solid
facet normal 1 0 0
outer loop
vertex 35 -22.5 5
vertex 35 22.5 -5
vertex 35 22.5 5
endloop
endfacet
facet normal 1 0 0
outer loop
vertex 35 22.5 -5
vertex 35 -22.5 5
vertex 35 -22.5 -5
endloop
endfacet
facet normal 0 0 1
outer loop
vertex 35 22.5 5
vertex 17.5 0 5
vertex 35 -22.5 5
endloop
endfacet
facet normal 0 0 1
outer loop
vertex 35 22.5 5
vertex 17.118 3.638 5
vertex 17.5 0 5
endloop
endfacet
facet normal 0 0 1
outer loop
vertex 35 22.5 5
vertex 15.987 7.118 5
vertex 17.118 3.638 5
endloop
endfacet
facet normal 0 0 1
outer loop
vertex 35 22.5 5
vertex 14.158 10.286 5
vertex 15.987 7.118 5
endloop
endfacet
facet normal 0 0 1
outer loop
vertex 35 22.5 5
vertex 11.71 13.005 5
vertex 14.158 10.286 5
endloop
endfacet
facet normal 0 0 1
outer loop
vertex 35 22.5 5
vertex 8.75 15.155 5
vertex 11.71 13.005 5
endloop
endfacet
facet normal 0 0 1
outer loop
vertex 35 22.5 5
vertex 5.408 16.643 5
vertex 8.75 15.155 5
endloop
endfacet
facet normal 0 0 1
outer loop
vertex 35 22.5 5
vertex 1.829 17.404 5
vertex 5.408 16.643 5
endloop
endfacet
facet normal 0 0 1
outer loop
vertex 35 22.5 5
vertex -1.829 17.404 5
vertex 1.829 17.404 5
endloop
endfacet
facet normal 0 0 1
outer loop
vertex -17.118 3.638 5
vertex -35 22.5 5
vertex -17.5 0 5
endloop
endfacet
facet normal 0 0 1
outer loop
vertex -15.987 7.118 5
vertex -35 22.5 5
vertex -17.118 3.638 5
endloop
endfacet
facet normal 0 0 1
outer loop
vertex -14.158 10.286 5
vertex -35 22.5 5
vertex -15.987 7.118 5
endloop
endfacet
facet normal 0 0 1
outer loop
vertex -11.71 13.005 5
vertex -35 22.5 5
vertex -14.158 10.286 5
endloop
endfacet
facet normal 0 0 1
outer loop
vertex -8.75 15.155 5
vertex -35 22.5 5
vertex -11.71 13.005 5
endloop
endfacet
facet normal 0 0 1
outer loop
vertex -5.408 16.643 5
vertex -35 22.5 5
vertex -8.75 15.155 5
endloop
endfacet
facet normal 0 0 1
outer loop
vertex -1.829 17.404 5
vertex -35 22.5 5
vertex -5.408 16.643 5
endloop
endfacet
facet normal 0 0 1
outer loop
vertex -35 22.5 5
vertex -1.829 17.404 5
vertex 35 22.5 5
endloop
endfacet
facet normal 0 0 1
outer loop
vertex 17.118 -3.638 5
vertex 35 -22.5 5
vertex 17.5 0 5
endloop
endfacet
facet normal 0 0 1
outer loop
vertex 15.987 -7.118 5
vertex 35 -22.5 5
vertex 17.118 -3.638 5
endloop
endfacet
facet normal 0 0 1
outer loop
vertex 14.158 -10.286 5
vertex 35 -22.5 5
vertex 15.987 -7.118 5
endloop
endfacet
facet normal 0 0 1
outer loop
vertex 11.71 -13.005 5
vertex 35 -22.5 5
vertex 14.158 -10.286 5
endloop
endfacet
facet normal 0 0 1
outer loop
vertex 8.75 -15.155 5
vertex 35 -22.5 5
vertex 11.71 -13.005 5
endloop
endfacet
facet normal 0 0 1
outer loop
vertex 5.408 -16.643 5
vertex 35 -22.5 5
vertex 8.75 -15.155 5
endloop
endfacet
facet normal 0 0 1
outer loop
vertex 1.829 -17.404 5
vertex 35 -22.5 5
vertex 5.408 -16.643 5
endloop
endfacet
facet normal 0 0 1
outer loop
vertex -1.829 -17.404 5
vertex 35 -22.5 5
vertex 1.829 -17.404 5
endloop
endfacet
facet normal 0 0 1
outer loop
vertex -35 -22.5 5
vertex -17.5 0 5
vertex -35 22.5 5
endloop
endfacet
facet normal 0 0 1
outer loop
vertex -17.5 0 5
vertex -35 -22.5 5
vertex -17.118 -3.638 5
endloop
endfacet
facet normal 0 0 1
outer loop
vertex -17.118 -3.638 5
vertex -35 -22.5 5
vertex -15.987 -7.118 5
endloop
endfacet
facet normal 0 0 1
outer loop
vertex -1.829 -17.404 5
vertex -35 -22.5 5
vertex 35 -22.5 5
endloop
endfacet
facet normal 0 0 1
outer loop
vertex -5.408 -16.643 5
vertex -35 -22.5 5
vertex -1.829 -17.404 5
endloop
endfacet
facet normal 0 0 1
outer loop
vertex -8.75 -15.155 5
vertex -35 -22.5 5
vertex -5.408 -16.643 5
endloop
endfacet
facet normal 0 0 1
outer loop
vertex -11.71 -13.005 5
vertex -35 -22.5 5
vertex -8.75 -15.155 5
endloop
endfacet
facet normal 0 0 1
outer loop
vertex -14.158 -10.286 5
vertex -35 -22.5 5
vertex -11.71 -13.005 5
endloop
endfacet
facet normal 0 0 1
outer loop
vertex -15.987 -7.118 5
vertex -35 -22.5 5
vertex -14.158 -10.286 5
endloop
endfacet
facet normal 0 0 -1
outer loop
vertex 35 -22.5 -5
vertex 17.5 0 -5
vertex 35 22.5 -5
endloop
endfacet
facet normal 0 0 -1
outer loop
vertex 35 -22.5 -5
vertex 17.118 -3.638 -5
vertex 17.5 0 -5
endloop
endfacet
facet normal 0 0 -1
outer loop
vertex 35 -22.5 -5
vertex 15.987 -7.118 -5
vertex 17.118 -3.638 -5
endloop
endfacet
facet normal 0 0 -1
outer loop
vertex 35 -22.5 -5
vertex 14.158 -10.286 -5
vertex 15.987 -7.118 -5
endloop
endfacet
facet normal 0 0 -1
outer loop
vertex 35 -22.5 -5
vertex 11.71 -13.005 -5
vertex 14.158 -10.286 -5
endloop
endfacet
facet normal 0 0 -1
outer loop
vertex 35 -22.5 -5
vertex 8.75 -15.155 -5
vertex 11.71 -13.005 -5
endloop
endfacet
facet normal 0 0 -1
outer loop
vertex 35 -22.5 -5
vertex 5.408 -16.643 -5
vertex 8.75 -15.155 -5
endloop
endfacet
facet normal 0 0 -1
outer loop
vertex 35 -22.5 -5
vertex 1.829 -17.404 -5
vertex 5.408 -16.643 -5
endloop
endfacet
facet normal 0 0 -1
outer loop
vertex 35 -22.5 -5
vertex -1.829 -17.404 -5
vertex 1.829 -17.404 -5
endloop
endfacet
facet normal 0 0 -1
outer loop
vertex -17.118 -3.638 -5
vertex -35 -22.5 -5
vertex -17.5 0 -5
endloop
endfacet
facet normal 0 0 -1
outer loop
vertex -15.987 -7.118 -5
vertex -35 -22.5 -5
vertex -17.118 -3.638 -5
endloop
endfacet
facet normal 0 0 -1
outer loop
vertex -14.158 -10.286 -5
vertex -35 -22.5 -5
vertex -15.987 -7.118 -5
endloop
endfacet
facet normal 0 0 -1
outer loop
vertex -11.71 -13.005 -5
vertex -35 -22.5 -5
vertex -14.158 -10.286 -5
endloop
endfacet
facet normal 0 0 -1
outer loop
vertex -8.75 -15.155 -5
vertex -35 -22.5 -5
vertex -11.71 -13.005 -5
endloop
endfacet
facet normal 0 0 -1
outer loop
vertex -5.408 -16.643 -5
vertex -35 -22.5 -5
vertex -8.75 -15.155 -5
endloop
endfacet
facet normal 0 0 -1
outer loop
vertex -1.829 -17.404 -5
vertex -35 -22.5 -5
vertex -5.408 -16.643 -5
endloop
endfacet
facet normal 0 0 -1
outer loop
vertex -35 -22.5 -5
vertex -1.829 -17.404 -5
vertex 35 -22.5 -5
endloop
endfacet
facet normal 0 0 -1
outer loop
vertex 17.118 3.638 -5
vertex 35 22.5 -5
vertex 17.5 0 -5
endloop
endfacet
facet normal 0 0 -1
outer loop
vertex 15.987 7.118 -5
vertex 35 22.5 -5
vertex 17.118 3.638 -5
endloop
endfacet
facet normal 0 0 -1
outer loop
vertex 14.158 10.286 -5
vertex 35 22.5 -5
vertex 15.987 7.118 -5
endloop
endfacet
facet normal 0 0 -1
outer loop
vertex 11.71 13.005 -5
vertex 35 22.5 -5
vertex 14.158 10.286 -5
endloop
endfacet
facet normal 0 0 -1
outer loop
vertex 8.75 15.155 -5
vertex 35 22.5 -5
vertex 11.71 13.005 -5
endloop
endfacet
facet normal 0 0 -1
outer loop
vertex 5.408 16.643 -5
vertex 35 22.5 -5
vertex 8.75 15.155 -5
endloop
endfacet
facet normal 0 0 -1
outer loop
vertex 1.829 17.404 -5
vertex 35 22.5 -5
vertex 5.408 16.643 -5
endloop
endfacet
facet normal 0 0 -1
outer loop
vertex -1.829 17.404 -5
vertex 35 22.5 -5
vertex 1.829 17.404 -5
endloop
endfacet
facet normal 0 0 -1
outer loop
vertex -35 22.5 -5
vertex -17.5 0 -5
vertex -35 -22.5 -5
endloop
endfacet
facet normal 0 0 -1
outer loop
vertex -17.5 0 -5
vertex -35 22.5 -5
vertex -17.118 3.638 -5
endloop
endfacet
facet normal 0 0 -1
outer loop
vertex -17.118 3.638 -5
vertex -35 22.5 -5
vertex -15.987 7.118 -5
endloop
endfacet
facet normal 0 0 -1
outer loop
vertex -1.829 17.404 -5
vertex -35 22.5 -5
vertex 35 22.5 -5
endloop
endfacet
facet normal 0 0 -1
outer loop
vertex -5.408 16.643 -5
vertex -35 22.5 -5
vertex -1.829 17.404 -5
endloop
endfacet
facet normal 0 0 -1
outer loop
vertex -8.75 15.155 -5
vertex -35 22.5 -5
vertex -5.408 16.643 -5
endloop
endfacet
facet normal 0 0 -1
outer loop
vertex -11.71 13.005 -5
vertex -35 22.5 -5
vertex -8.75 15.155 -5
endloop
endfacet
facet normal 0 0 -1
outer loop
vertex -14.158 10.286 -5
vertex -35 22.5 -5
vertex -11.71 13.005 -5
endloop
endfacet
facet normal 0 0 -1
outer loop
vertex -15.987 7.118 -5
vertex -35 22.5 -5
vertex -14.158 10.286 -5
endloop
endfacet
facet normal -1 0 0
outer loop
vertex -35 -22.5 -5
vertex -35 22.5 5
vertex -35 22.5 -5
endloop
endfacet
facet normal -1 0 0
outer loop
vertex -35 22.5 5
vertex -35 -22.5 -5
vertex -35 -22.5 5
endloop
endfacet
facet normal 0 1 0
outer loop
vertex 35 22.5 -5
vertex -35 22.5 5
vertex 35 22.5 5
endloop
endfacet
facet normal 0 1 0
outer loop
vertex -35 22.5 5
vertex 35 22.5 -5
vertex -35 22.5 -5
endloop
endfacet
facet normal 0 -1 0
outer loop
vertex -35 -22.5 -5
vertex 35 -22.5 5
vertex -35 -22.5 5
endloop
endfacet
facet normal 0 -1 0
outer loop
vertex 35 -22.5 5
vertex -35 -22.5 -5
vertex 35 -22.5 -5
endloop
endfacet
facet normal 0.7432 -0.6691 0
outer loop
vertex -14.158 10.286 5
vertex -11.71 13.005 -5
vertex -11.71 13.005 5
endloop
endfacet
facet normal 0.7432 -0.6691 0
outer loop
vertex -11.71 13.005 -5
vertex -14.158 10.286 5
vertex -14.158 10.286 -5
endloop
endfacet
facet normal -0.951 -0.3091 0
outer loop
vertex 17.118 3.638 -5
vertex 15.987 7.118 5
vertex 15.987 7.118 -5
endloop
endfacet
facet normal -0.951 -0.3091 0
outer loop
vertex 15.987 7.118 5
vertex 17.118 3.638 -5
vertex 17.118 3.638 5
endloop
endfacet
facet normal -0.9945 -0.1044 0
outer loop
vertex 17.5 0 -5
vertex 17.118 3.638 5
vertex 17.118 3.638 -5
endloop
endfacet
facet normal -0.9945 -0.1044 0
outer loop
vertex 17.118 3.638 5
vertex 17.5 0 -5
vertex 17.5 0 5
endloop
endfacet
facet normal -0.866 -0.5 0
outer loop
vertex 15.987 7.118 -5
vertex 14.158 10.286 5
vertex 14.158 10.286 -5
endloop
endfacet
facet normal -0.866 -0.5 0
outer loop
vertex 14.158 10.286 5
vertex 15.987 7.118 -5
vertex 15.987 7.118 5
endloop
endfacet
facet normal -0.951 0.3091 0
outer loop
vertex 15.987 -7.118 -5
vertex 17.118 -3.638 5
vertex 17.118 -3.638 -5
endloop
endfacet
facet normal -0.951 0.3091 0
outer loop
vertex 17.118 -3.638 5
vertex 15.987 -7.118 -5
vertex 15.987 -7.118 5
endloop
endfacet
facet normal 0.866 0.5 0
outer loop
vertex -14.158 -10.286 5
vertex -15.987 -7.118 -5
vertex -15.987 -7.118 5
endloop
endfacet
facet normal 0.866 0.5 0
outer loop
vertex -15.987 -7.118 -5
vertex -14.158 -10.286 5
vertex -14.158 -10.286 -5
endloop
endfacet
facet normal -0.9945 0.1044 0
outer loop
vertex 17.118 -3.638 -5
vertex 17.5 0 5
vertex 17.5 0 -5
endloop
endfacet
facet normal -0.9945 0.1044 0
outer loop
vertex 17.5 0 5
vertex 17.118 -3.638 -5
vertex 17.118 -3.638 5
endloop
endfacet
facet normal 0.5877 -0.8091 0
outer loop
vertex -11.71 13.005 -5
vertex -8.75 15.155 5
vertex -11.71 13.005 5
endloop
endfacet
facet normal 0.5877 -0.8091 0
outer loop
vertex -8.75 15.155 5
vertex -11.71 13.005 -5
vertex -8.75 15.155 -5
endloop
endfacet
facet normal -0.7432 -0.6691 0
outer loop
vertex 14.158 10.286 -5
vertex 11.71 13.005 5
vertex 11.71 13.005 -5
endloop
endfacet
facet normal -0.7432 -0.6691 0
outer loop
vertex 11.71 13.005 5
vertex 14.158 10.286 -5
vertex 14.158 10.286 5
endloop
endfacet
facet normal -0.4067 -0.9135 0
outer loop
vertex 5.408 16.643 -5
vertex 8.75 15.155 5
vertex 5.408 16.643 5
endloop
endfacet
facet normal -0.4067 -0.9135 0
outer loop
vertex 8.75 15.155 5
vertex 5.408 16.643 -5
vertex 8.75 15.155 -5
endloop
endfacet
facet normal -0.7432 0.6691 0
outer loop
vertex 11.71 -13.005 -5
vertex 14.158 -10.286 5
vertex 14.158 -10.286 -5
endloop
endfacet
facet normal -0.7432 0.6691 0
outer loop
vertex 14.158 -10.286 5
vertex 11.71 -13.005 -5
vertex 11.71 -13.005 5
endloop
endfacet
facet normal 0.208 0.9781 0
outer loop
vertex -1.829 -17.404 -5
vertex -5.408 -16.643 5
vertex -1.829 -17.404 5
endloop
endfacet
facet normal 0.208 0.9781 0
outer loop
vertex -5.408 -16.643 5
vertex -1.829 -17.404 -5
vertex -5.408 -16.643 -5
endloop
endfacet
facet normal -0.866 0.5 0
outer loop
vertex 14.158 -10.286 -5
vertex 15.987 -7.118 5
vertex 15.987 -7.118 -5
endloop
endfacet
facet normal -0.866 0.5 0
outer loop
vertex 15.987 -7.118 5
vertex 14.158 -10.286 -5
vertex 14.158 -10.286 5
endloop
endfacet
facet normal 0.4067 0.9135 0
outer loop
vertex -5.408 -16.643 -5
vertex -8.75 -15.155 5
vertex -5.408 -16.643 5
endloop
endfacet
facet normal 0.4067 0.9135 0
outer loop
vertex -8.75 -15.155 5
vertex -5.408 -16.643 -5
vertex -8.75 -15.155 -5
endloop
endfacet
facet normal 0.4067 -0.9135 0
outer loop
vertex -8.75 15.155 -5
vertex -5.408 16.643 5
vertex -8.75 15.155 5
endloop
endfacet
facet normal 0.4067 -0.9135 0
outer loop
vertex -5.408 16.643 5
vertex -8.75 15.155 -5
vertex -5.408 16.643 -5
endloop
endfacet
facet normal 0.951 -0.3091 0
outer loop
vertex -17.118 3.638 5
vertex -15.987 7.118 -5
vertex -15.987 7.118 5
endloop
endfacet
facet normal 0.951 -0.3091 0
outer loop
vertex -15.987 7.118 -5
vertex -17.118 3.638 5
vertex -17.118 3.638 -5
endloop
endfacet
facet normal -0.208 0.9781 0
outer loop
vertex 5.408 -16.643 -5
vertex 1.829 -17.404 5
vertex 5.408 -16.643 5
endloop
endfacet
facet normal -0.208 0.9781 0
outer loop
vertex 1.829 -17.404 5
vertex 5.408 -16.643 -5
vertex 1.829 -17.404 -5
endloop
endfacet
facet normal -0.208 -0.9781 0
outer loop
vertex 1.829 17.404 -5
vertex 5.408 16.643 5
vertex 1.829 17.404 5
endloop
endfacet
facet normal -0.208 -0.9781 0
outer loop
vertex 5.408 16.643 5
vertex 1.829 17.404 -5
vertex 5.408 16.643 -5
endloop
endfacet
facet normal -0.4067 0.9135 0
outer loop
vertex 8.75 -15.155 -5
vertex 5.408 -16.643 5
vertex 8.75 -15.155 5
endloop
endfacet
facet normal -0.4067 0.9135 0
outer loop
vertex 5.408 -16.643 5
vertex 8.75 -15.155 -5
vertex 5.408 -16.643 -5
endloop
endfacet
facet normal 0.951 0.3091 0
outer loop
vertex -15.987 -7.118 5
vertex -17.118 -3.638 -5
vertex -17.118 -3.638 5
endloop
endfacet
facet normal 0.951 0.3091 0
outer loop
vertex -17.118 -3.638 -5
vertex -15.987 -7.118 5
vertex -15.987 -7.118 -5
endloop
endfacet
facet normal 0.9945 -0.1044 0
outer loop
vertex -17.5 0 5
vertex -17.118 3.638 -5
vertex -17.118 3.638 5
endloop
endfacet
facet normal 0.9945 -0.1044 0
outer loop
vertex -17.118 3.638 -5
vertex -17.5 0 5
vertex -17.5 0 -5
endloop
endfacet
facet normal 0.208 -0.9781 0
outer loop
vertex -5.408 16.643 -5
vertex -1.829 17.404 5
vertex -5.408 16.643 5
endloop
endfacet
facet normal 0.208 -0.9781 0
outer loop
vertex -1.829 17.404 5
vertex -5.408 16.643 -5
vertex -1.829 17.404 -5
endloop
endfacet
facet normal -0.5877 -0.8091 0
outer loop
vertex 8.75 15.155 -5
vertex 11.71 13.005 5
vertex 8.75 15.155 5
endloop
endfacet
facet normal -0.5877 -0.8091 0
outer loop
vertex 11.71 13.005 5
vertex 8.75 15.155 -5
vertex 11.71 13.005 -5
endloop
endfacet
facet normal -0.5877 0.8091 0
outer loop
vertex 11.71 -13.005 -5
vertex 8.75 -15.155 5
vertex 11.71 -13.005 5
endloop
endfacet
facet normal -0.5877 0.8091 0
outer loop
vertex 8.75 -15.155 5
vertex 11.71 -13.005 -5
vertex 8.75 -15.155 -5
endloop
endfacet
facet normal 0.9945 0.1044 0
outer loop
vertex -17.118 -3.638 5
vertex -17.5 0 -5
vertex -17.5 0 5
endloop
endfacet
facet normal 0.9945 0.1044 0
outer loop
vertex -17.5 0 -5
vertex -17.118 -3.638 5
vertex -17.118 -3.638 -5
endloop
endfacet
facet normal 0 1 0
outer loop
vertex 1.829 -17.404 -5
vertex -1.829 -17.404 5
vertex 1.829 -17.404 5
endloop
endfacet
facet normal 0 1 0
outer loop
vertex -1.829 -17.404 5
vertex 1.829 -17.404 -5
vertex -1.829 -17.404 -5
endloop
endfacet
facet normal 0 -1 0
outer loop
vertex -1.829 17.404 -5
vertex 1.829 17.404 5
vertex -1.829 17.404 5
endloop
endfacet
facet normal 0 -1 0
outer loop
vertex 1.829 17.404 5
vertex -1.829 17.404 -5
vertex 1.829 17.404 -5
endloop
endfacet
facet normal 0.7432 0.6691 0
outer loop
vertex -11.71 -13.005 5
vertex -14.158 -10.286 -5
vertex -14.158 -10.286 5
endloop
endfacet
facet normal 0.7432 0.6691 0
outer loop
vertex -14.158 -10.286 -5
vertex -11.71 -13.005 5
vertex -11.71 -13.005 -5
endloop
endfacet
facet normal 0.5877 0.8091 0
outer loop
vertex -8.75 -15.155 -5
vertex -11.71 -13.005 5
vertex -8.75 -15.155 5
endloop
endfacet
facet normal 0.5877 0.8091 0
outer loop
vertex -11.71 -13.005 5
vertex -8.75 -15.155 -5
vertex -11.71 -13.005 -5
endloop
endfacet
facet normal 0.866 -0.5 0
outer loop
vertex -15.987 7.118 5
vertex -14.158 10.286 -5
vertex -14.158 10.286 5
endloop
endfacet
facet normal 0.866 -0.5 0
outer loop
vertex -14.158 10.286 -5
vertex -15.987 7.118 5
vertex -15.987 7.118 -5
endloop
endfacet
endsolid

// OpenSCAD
//Turbidostat
//Chamber
//Board Holder
//by: Agostino Guarino agostinoguarino@gmail.com


//Dimensions of the Test Tube, in mm
ttube_ext_diam=25;

//Structure Dimensions
ext_tolerance=1; //gap between the tube and the holder
support_ext_diam=ttube_ext_diam+8;
base_thickness=15;
side1=37+support_ext_diam;
side2=12+support_ext_diam;
height=10;

difference(){
        
        cube([side1,side2,height],true);
        
        cylinder(h = height, r1 = (support_ext_diam/2)+ext_tolerance, r2 = (support_ext_diam/2)+ext_tolerance, center = true);
}
